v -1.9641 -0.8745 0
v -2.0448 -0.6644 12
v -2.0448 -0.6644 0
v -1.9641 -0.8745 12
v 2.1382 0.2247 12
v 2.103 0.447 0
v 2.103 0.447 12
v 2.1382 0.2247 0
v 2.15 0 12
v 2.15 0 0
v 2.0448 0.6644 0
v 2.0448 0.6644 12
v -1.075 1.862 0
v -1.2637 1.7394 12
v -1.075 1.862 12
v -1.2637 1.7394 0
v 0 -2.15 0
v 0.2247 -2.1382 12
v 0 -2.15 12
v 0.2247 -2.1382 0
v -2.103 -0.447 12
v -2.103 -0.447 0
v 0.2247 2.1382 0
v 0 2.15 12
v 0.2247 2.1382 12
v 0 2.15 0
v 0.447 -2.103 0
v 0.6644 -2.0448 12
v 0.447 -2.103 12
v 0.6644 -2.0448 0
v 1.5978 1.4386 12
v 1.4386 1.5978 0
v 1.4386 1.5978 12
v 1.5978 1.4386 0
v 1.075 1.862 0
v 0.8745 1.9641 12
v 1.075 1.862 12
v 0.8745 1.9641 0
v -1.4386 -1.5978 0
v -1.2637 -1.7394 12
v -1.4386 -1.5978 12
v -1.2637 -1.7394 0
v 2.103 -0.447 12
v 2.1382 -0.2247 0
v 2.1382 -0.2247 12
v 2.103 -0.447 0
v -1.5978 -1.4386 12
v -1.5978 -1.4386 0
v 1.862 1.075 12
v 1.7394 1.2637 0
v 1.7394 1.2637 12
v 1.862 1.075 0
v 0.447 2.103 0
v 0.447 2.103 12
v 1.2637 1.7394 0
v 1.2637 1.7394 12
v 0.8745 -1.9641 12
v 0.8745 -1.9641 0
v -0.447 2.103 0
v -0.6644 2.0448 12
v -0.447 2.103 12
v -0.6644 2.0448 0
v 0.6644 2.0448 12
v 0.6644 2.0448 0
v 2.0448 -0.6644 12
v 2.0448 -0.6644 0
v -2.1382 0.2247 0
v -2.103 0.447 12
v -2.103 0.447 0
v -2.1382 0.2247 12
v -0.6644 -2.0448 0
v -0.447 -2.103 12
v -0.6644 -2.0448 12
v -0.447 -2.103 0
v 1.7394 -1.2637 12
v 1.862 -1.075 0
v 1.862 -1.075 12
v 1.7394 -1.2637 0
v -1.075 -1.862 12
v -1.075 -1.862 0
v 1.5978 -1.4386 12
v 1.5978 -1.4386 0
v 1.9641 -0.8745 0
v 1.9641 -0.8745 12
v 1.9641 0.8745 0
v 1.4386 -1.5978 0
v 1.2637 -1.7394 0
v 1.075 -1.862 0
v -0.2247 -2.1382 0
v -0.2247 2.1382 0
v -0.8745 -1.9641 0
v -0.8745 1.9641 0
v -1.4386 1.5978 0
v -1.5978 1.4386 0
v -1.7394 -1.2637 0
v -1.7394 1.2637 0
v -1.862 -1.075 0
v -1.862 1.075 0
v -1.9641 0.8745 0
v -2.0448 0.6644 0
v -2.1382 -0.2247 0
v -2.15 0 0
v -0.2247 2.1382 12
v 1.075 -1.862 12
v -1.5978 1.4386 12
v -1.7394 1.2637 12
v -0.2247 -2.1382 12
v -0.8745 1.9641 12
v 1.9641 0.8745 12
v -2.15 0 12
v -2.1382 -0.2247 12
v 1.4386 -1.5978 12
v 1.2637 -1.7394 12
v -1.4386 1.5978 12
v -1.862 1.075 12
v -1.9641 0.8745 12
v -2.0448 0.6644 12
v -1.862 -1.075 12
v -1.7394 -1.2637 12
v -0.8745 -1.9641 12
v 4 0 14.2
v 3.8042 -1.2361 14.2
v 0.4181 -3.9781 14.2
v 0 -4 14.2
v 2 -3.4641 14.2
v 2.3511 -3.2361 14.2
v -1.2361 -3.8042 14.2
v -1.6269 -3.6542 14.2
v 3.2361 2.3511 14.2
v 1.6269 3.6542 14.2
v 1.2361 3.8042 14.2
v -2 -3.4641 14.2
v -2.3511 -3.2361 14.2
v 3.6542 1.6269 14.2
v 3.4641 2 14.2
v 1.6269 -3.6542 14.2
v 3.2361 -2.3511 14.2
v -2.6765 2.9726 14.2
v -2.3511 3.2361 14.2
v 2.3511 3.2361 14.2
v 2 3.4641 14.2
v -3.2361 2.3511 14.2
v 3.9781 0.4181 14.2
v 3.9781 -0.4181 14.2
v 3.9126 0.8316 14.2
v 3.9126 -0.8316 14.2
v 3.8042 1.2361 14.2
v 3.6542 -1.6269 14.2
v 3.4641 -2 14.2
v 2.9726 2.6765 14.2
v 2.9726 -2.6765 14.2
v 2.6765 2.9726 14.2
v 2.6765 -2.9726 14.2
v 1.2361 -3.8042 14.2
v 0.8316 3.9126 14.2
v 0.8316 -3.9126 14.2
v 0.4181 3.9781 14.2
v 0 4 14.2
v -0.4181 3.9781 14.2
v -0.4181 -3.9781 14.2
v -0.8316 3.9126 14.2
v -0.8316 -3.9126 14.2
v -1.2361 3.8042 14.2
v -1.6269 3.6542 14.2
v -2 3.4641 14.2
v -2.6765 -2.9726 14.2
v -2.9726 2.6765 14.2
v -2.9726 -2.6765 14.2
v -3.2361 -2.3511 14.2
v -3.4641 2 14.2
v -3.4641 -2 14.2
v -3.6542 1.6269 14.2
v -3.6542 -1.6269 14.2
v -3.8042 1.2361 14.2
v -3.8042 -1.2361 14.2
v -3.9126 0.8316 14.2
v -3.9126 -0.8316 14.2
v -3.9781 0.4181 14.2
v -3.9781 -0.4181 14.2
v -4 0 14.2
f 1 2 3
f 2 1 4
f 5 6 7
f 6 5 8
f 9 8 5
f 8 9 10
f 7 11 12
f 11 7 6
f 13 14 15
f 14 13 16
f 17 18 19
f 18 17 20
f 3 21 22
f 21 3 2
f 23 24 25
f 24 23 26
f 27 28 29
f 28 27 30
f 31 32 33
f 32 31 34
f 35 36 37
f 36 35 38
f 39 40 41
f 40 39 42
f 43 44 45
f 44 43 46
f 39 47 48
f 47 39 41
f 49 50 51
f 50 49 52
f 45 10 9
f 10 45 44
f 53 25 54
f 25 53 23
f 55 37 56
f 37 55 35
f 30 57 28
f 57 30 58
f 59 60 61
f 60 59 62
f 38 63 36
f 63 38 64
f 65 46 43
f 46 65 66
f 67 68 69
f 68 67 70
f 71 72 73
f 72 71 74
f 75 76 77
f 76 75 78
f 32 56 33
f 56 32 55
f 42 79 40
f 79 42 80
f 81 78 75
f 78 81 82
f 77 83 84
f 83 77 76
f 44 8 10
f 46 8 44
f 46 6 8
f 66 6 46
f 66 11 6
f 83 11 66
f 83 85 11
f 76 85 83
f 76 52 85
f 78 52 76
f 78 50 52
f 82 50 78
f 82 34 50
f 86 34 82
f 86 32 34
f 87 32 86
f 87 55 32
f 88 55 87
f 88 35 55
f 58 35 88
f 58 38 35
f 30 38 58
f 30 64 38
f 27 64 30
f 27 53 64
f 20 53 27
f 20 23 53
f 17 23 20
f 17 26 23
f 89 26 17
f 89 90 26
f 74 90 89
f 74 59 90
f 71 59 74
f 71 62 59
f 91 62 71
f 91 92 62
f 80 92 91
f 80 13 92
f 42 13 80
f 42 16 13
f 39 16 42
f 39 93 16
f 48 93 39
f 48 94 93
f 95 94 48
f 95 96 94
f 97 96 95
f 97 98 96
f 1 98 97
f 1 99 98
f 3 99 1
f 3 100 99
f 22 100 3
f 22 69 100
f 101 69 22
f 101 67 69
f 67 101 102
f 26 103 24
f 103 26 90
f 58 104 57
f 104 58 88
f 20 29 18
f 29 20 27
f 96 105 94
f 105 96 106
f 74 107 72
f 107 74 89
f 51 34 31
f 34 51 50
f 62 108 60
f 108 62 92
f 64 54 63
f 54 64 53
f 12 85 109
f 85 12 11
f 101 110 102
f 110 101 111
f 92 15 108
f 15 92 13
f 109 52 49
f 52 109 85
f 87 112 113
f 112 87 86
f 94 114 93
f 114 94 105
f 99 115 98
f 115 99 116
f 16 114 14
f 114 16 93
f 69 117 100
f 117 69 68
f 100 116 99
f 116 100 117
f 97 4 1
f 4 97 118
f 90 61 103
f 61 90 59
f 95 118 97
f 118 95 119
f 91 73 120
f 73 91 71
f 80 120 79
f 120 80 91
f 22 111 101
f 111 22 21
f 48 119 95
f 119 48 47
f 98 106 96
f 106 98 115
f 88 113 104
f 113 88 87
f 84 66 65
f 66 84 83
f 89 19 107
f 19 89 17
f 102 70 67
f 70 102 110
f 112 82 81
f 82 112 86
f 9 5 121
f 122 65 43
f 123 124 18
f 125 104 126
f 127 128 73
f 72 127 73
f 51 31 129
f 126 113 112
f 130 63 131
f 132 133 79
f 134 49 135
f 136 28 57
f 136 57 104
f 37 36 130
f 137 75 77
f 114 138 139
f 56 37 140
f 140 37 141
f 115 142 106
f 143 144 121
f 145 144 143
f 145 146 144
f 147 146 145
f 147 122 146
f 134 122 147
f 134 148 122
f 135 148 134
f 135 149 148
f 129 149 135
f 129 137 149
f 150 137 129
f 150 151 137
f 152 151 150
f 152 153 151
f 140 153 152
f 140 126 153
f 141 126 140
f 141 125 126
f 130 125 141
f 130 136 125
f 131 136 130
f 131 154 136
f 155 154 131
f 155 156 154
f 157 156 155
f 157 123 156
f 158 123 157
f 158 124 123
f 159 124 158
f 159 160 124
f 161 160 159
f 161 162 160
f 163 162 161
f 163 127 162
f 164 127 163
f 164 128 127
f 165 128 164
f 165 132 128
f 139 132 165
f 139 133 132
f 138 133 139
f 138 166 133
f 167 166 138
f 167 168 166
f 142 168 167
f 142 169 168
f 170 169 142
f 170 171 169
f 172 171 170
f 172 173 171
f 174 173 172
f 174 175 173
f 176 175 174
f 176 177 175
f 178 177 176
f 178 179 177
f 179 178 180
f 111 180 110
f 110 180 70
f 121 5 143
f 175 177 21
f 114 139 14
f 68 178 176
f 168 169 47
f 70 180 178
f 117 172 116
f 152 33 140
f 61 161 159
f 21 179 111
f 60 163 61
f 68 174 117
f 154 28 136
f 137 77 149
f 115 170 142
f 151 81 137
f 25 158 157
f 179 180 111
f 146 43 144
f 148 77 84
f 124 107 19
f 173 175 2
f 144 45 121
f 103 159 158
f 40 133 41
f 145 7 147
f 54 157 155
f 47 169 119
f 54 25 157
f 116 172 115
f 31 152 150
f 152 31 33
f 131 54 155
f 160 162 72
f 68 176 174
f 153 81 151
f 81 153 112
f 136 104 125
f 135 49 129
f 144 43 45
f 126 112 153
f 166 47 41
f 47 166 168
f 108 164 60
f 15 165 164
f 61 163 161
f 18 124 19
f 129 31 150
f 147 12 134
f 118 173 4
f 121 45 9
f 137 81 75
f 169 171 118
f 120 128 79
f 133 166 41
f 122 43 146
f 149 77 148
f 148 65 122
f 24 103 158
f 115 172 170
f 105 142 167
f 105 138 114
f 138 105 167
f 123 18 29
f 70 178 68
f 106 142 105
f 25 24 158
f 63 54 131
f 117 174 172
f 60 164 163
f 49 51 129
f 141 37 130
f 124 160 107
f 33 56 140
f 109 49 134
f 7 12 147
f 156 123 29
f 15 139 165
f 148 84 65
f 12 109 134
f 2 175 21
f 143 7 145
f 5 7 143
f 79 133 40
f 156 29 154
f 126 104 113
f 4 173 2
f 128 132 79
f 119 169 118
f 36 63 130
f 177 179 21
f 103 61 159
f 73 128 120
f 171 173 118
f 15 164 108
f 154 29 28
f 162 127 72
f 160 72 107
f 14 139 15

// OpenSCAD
// Countersunk screw with 90-degree conical head.
$fn = 60;
eps = 0.02;
shaft_d = 4.3;
head_d = 8;
head_h = 2.2;
shaft_l = 12;
union() {
    cylinder(d = shaft_d, h = shaft_l);
    translate([0, 0, shaft_l]) cylinder(d1 = shaft_d, d2 = head_d, h = head_h);
}
